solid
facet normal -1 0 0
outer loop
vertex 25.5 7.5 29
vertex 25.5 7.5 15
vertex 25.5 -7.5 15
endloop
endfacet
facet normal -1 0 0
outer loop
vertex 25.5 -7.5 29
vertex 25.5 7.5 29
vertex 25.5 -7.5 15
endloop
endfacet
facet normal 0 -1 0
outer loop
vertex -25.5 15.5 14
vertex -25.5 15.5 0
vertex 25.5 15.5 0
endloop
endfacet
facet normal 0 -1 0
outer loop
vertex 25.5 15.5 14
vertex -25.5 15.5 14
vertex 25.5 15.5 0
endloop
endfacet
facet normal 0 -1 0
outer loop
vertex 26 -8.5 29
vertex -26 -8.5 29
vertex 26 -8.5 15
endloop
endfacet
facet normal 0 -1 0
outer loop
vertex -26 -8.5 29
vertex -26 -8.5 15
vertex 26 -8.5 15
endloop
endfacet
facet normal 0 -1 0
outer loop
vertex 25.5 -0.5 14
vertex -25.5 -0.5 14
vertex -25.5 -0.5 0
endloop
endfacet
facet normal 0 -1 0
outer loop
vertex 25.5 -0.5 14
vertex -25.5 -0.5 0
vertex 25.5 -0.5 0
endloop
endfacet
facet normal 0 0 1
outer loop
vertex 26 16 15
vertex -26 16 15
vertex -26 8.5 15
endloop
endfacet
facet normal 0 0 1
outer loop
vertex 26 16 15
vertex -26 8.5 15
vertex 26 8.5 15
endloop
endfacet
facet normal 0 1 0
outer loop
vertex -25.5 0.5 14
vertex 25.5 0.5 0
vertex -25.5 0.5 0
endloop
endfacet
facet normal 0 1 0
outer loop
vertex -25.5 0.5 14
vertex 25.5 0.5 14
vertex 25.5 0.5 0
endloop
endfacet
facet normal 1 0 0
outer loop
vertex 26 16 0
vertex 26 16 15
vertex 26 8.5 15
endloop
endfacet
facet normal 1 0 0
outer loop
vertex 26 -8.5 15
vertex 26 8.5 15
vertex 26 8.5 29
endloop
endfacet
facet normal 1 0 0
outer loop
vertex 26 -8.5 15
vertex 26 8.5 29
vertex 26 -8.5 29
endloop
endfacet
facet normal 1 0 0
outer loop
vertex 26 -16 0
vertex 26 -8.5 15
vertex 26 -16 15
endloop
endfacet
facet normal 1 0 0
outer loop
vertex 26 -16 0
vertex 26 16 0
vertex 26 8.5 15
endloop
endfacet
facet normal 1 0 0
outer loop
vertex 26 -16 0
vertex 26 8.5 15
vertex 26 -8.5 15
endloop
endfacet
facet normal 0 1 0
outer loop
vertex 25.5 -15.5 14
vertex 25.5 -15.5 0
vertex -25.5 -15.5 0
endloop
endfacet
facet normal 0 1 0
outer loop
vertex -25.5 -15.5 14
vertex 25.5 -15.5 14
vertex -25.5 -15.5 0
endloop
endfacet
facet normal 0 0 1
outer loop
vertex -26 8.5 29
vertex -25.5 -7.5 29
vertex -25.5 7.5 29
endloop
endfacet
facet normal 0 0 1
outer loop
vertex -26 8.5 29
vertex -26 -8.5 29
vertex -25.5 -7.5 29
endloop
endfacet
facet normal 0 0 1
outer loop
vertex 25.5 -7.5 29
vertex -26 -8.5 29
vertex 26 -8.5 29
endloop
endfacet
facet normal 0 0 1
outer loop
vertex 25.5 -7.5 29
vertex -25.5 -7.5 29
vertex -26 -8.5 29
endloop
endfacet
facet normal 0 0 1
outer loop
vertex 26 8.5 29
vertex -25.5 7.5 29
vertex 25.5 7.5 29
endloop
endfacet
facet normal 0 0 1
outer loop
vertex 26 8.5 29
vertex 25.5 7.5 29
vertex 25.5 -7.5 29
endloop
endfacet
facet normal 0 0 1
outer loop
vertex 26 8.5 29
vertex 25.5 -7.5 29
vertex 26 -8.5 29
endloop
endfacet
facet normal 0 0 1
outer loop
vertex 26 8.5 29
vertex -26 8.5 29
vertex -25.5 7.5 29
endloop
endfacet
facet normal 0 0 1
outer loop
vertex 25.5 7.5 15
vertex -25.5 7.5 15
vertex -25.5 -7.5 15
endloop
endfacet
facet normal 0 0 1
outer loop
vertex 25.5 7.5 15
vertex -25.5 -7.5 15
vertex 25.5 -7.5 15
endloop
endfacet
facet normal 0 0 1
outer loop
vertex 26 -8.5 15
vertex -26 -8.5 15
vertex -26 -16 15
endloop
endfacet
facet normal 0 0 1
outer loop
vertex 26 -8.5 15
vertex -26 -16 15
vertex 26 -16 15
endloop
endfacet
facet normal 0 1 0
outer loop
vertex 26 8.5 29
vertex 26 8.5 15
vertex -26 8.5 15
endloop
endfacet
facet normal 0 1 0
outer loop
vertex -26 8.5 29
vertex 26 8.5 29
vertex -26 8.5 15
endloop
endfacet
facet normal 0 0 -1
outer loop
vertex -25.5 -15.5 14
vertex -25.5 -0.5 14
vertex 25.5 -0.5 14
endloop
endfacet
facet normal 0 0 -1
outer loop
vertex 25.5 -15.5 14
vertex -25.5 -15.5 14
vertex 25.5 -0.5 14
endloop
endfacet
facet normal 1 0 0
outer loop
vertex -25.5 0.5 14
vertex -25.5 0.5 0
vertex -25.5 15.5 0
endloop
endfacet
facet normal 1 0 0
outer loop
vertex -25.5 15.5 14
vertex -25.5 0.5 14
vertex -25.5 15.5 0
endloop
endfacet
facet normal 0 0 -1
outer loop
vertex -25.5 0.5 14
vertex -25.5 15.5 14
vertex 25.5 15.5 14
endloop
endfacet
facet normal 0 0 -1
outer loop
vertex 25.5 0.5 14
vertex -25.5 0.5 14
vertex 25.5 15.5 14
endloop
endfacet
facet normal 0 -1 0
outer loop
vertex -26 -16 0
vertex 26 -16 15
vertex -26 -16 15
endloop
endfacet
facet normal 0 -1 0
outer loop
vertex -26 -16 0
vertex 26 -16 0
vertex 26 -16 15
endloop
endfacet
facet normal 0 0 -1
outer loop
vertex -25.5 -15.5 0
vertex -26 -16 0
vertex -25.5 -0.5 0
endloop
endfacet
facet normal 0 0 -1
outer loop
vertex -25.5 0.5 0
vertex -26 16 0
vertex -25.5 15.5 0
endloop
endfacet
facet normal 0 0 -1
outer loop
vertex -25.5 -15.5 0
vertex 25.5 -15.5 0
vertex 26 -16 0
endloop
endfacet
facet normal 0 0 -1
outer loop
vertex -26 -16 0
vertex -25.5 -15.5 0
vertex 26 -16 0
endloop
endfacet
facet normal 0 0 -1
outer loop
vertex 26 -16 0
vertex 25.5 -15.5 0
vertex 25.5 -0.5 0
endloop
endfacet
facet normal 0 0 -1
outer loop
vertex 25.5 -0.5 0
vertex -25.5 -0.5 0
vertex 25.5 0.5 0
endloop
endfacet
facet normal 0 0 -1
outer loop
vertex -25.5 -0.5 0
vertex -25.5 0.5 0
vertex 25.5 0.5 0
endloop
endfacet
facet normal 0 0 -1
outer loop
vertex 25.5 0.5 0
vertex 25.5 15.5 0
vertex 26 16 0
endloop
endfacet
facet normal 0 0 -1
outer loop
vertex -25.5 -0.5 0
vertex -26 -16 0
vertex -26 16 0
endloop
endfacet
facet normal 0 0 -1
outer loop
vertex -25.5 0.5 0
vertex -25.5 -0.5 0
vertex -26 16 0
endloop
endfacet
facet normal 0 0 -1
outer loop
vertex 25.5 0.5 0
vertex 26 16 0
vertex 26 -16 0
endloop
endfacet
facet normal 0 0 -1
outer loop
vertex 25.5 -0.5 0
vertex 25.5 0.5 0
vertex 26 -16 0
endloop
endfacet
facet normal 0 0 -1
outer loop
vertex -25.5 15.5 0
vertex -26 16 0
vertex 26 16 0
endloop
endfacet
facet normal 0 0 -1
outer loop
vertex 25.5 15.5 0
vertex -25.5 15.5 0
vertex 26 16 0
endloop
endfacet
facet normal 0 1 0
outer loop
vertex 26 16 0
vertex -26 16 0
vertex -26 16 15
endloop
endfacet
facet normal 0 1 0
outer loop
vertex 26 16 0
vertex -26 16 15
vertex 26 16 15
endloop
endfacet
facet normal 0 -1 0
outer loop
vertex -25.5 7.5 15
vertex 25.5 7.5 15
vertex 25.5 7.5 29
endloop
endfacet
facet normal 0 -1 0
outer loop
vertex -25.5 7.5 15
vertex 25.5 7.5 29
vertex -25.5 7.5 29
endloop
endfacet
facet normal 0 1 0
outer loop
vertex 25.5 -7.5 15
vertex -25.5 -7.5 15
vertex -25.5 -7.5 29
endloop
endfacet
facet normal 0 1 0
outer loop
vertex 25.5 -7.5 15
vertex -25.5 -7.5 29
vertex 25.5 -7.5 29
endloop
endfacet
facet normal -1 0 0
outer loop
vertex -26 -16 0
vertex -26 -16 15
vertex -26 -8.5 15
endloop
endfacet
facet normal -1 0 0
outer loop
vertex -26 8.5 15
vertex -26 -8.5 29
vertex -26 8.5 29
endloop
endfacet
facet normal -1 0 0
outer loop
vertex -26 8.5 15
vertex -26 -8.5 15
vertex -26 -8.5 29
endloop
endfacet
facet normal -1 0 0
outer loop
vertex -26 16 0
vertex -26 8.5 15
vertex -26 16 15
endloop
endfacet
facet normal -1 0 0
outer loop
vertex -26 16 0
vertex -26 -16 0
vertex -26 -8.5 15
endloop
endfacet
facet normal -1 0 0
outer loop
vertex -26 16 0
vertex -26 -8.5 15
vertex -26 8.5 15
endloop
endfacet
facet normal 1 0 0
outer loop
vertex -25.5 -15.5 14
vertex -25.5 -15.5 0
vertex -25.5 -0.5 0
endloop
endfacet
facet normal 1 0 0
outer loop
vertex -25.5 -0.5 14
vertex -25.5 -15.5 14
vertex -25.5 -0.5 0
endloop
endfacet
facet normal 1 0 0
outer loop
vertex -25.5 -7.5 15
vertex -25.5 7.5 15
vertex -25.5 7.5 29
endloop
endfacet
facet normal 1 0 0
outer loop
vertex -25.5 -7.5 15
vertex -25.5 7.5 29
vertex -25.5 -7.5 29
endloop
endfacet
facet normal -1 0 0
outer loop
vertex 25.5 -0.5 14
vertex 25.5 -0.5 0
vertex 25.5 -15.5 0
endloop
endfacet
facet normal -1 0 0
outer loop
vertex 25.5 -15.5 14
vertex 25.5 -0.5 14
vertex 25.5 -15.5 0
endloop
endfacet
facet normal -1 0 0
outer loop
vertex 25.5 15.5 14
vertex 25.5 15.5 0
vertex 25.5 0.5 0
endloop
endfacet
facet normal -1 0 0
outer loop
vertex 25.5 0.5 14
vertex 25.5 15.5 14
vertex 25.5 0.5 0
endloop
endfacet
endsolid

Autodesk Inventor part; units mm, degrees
ref_plane "YZ Plane" through (0, 0, 0) normal (1, 0, 0) x (0, 1, 0)
ref_plane "XZ Plane" through (0, 0, 0) normal (0, 1, 0) x (-1, 0, 0)
ref_plane "XY Plane" through (0, 0, 0) normal (0, 0, 1) x (1, 0, 0)
sketch "Szkic1" plane through (0, 0, 0) normal (0, 0, 1) x (1, 0, 0)
  line L0 (25.5, -15.5) -> (-25.5, -15.5)
  line L1 (-25.5, -15.5) -> (-25.5, 15.5)
  line L2 (-25.5, 15.5) -> (25.5, 15.5)
  line L3 (25.5, 15.5) -> (25.5, -15.5)
  line L4 (25.5, -15.5) -> (-25.5, 15.5) construction
  line L5 (-25.5, -15.5) -> (25.5, 15.5) construction
  line L6 (26, -16) -> (-26, -16)
  line L7 (-26, -16) -> (-26, 16)
  line L8 (-26, 16) -> (26, 16)
  line L9 (26, 16) -> (26, -16)
  line L10 (26, -16) -> (-26, 16) construction
  line L11 (-26, -16) -> (26, 16) construction
  point P0 (0, 0)
  dimension "d0" = 51
  dimension "d1" = 31
  dimension "d2" = 52
  dimension "d3" = 32
extrude "Wyciągnięcie proste1" add sketch "Szkic1" along normal blind 15
sketch "Szkic2" plane through (0, 0, 15) normal (0, 0, 1) x (1, 0, 0)
  line L0 (-25.5, -15.5) -> (-25.5, 15.5) projected
  line L1 (25.5, -15.5) -> (-25.5, -15.5)
  line L2 (-25.5, -15.5) -> (-25.5, 15.5)
  line L3 (-25.5, 15.5) -> (25.5, 15.5)
  line L4 (25.5, 15.5) -> (25.5, -15.5)
  line L5 (25.5, -15.5) -> (-25.5, 15.5) construction
  line L6 (-25.5, -15.5) -> (25.5, 15.5) construction
  point P0 (0, 0)
extrude "Wyciągnięcie proste2" add sketch "Szkic2" against normal blind 1
sketch "Szkic4" plane through (0, 0, 14) normal (0, 0, -1) x (-1, 0, 0)
  line L0 (-25.5, -15.5) -> (-25.5, 15.5) projected
  line L1 (-25.5, 0) -> (-25.5, 0.5)
  line L2 (-25.5, 0.5) -> (25.5, 0.5)
  line L3 (25.5, 15.5) -> (25.5, -15.5) projected
  line L4 (25.5, -0.5) -> (-25.5, -0.5)
  point P0 (0, 0)
  dimension "d14" = 0.5
extrude "Wyciągnięcie proste4" add sketch "Szkic4" along normal blind 14
sketch "Szkic5" plane through (0, 0, 15) normal (0, 0, 1) x (1, 0, 0)
  line L0 (0, 0) -> (0, 7.5)
  line L1 (0, 7.5) -> (0, 8.5)
  line L2 (0, 8.5) -> (26, 8.5)
  line L3 (26, -16) -> (26, 16) projected
  line L4 (0, 8.5) -> (-26, 8.5)
  line L5 (-26, 16) -> (-26, -16) projected
  line L6 (25.5, -0.5) -> (-25.5, -0.5) projected
  line L7 (0, 0) -> (0, -7.5)
  line L8 (0, -7.5) -> (26, -7.5)
  line L9 (0, -7.5) -> (-26, -7.5)
  line L10 (0, 7.5) -> (26, 7.5)
  line L11 (26, 8.5) -> (26, 7.5)
  line L12 (0, 7.5) -> (-26, 7.5)
  line L13 (-26, 8.5) -> (-26, 7.5)
  line L14 (-26, -7.5) -> (-26, -8.5)
  line L15 (-26, -8.5) -> (26, -8.5)
  line L16 (26, -7.5) -> (26, -8.5)
  line L17 (26, -7.5) -> (26, 7.5)
  line L18 (-26, 7.5) -> (-26, -7.5)
  dimension "d17" = 7.5
  dimension "d18" = 1
  dimension "d20" = 7.5
  dimension "d21" = 1
extrude "Wyciągnięcie proste5" add sketch "Szkic5" along normal blind 14 contours L12 L5 L4 L1 | L1 L2 L3 L10 | L8 L3 L15 L5 L9
sketch "Szkic7" plane through (0, 0, 15) normal (0, 0, 1) x (1, 0, 0)
  line L0 (26, 7.5) -> (-26, 7.5) projected
  line L1 (-26, 7.5) -> (-25.5, 7.5)
  line L2 (-25.5, 7.5) -> (-25.5, -7.5)
  line L3 (-25.5, -15.5) -> (-25.5, -0.5) projected
  line L4 (26, -7.5) -> (-26, -7.5) projected
  line L5 (-25.5, -7.5) -> (-26, -7.5)
  line L6 (-26, 8.5) -> (-26, 7.5) projected
  line L7 (-26, -7.5) -> (-26, 7.5)
  line L8 (26, 7.5) -> (25.5, 7.5)
  line L9 (25.5, 15.5) -> (25.5, 0.5) projected
  line L10 (25.5, 7.5) -> (25.5, -7.5)
  line L11 (25.5, -0.5) -> (25.5, -15.5) projected
  line L12 (25.5, -7.5) -> (26, -7.5)
  line L13 (26, -7.5) -> (26, 7.5)
  line L14 (26, -16) -> (26, 16) projected
  point P0 (0, 0)
  point P1 (25.5, 0.5)
  dimension "d30" = 0.5
  dimension "d31" = 15
extrude "Wyciągnięcie proste7" add sketch "Szkic7" along normal blind 14 contours L13 L4 L10 L9 L0 | L2 L4 L7 L0
properties part number "Magazynek na baterie"
